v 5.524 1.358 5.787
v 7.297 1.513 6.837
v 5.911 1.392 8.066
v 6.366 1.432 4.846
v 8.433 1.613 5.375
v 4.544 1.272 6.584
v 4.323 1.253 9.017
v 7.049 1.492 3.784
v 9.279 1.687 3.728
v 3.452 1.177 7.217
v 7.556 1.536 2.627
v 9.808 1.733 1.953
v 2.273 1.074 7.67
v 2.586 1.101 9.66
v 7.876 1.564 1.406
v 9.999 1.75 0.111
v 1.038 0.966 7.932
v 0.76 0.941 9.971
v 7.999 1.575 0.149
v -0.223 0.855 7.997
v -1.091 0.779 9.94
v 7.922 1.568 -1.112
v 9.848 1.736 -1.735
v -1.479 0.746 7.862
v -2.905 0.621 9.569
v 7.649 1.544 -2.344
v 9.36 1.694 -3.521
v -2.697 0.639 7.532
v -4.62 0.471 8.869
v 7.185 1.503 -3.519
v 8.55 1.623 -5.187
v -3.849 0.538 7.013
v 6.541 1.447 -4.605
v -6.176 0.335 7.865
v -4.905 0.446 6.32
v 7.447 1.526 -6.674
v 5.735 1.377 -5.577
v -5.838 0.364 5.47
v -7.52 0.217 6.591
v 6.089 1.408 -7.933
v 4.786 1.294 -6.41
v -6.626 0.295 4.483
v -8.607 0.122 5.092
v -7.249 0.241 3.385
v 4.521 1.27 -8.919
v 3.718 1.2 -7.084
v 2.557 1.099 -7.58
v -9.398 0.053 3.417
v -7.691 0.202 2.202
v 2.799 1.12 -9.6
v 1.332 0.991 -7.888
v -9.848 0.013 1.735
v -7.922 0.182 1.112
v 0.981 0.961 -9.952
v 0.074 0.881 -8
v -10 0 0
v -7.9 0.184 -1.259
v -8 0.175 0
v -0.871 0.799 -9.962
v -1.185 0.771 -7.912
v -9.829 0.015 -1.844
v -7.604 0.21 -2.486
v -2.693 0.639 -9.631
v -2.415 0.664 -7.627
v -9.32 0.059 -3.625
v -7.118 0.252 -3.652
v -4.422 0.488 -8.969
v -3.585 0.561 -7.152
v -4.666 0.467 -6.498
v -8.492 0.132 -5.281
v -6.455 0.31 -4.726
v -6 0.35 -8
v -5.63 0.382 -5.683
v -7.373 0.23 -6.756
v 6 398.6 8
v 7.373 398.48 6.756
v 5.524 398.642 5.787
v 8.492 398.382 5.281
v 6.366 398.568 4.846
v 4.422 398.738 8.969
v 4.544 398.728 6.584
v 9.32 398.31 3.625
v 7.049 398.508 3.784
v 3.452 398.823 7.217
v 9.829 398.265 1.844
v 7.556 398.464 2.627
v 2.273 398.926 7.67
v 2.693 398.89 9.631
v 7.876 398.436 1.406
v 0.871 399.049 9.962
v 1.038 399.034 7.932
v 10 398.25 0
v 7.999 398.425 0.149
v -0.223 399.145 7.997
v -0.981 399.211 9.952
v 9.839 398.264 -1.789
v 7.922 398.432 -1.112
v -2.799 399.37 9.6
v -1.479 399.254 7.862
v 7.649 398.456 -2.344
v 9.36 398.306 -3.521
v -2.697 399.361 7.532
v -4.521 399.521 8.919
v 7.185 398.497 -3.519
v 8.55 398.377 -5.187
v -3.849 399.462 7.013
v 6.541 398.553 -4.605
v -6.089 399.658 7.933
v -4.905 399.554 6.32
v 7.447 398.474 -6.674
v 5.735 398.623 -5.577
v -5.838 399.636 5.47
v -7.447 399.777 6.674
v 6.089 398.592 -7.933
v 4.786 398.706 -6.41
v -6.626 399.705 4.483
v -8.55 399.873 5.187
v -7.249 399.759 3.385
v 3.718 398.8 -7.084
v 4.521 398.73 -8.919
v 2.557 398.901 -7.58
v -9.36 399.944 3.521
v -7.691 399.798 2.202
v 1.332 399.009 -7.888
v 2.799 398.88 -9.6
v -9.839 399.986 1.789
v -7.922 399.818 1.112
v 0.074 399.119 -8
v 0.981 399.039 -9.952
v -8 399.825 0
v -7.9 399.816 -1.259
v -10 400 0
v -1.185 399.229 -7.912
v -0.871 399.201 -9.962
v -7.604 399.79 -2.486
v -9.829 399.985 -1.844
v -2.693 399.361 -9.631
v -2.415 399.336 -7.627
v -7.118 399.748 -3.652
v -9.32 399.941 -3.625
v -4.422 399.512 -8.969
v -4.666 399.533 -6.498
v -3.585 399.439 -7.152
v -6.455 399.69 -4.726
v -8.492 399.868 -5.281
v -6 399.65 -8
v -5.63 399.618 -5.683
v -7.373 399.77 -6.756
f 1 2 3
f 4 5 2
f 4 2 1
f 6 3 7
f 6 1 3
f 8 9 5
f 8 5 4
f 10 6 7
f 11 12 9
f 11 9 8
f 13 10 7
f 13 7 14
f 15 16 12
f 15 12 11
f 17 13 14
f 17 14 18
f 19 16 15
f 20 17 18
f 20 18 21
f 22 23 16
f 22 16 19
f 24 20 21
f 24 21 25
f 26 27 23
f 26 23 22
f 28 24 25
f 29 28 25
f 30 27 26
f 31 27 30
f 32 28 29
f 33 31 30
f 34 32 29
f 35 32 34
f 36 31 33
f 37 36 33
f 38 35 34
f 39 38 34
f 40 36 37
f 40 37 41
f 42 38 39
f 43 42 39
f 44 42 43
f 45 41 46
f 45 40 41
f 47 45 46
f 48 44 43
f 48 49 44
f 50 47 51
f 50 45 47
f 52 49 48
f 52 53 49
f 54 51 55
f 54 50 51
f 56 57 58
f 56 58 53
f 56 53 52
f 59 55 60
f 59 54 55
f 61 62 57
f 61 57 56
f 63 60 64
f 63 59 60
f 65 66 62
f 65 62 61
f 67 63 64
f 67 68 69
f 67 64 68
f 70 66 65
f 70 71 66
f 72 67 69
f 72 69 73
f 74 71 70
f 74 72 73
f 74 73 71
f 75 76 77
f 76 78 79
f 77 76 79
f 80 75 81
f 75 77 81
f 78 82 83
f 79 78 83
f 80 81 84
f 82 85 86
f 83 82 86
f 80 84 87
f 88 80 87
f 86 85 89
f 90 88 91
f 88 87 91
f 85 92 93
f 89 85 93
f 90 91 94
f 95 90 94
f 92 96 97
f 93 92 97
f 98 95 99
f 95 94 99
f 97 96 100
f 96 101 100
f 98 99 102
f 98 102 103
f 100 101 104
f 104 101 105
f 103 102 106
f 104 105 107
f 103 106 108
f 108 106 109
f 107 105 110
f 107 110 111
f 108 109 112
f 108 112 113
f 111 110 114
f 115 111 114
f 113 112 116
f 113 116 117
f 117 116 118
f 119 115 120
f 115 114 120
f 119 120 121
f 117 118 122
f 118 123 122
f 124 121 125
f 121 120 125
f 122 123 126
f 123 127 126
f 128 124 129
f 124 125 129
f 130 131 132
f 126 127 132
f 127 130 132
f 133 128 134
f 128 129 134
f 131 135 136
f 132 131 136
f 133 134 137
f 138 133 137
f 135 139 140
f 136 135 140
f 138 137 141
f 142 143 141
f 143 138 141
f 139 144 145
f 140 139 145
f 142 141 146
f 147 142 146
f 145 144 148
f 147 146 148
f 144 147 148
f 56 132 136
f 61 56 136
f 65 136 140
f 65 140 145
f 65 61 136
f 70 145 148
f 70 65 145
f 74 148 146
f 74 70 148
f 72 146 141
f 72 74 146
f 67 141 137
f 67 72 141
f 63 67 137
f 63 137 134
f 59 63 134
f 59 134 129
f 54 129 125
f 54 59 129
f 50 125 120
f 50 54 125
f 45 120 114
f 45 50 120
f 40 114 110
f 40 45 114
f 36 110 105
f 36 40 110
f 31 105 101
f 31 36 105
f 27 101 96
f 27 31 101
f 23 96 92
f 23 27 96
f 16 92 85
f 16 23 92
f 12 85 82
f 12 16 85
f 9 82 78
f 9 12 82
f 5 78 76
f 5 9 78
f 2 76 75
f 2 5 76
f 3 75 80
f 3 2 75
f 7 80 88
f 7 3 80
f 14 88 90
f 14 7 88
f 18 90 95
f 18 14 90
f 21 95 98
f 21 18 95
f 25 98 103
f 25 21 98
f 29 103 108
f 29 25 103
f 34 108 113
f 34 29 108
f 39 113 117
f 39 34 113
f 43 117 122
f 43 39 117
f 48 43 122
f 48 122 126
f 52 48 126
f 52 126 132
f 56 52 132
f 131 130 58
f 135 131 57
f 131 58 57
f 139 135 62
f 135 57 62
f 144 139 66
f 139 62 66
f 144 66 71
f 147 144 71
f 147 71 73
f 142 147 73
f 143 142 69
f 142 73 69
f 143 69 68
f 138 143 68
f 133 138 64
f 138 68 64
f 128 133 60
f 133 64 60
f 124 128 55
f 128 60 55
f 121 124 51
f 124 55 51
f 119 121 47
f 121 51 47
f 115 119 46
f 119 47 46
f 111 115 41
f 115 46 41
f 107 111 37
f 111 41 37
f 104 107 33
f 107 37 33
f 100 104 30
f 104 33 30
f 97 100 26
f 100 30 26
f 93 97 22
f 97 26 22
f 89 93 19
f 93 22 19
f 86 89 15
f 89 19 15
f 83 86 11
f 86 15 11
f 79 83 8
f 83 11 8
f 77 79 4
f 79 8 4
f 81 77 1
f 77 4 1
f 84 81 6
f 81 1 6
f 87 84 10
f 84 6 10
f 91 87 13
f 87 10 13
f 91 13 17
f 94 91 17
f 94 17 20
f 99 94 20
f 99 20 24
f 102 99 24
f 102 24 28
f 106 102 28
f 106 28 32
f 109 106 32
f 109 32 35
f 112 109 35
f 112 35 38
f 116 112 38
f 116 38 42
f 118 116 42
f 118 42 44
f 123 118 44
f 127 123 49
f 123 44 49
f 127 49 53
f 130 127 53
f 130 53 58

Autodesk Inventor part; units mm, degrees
ref_plane "YZ Plane" through (0, 0, 0) normal (1, 0, 0) x (0, 1, 0)
ref_plane "XZ Plane" through (0, 0, 0) normal (0, 1, 0) x (-1, 0, 0)
ref_plane "XY Plane" through (0, 0, 0) normal (0, 0, 1) x (1, 0, 0)
sketch "Szkic1" plane through (0, 0, 0) normal (0, 1, 0) x (-1, 0, 0)
  circle A0 centre (0, 0) radius 10
  dimension "d0" = 20
extrude "Wyciągnięcie proste1" add sketch "Szkic1" along normal blind 400
shell "Skorupa1" thickness 2 removed faces 2 at (1.182, 0, 3.1167) at (1.182, 400, 3.1167)
sketch "Szkic2" plane through (0, 0, 0) normal (0, 0, 1) x (1, 0, 0)
  line L0 (-10, 0) -> (10, 0) construction
  line L1 (-10, 0) -> (10, 0)
  line L2 (22.37, 2.832) -> (-10, 0)
  line L3 (10, 0) -> (22.37, 2.832)
  line L4 (10, 400) -> (-10, 400) construction
  line L5 (10, 0) -> (10, 400) construction
  line L6 (-10, 400) -> (10, 400)
  line L7 (10, 400) -> (10, 398.2502)
  line L8 (10, 398.2502) -> (-10, 400)
  point P0 (0, 0)
  dimension "d4" = 5
  dimension "d7" = 5
extrude "Wyciągnięcie proste3" cut sketch "Szkic2" along normal mid plane 32
equation "\"PromieńGięcia\" = Grubość"
equation "\"SzerokośćGięciaPodcięcia\" = Grubość"
equation "\"GłębokośćGięciaPodcięcia\" = 0.5 * Grubość"
equation "\"RozmiarPodcięciaNarożnika\" = 4 * Grubość"
equation "\"MinimalnaPozostałość\" = 2 * Grubość"
equation "\"PromieńPrzejścia\" = PromieńGięcia"
equation "\"Rozmiar_promienia_Jacobiego\" = Grubość"
equation "\"Wielk_odstępu\" = Grubość"
equation "\"Grubość\" = 0.5"
properties part number "Rura_poprzeczna_ergosiedziska" material "Aluminium AW-7020"
